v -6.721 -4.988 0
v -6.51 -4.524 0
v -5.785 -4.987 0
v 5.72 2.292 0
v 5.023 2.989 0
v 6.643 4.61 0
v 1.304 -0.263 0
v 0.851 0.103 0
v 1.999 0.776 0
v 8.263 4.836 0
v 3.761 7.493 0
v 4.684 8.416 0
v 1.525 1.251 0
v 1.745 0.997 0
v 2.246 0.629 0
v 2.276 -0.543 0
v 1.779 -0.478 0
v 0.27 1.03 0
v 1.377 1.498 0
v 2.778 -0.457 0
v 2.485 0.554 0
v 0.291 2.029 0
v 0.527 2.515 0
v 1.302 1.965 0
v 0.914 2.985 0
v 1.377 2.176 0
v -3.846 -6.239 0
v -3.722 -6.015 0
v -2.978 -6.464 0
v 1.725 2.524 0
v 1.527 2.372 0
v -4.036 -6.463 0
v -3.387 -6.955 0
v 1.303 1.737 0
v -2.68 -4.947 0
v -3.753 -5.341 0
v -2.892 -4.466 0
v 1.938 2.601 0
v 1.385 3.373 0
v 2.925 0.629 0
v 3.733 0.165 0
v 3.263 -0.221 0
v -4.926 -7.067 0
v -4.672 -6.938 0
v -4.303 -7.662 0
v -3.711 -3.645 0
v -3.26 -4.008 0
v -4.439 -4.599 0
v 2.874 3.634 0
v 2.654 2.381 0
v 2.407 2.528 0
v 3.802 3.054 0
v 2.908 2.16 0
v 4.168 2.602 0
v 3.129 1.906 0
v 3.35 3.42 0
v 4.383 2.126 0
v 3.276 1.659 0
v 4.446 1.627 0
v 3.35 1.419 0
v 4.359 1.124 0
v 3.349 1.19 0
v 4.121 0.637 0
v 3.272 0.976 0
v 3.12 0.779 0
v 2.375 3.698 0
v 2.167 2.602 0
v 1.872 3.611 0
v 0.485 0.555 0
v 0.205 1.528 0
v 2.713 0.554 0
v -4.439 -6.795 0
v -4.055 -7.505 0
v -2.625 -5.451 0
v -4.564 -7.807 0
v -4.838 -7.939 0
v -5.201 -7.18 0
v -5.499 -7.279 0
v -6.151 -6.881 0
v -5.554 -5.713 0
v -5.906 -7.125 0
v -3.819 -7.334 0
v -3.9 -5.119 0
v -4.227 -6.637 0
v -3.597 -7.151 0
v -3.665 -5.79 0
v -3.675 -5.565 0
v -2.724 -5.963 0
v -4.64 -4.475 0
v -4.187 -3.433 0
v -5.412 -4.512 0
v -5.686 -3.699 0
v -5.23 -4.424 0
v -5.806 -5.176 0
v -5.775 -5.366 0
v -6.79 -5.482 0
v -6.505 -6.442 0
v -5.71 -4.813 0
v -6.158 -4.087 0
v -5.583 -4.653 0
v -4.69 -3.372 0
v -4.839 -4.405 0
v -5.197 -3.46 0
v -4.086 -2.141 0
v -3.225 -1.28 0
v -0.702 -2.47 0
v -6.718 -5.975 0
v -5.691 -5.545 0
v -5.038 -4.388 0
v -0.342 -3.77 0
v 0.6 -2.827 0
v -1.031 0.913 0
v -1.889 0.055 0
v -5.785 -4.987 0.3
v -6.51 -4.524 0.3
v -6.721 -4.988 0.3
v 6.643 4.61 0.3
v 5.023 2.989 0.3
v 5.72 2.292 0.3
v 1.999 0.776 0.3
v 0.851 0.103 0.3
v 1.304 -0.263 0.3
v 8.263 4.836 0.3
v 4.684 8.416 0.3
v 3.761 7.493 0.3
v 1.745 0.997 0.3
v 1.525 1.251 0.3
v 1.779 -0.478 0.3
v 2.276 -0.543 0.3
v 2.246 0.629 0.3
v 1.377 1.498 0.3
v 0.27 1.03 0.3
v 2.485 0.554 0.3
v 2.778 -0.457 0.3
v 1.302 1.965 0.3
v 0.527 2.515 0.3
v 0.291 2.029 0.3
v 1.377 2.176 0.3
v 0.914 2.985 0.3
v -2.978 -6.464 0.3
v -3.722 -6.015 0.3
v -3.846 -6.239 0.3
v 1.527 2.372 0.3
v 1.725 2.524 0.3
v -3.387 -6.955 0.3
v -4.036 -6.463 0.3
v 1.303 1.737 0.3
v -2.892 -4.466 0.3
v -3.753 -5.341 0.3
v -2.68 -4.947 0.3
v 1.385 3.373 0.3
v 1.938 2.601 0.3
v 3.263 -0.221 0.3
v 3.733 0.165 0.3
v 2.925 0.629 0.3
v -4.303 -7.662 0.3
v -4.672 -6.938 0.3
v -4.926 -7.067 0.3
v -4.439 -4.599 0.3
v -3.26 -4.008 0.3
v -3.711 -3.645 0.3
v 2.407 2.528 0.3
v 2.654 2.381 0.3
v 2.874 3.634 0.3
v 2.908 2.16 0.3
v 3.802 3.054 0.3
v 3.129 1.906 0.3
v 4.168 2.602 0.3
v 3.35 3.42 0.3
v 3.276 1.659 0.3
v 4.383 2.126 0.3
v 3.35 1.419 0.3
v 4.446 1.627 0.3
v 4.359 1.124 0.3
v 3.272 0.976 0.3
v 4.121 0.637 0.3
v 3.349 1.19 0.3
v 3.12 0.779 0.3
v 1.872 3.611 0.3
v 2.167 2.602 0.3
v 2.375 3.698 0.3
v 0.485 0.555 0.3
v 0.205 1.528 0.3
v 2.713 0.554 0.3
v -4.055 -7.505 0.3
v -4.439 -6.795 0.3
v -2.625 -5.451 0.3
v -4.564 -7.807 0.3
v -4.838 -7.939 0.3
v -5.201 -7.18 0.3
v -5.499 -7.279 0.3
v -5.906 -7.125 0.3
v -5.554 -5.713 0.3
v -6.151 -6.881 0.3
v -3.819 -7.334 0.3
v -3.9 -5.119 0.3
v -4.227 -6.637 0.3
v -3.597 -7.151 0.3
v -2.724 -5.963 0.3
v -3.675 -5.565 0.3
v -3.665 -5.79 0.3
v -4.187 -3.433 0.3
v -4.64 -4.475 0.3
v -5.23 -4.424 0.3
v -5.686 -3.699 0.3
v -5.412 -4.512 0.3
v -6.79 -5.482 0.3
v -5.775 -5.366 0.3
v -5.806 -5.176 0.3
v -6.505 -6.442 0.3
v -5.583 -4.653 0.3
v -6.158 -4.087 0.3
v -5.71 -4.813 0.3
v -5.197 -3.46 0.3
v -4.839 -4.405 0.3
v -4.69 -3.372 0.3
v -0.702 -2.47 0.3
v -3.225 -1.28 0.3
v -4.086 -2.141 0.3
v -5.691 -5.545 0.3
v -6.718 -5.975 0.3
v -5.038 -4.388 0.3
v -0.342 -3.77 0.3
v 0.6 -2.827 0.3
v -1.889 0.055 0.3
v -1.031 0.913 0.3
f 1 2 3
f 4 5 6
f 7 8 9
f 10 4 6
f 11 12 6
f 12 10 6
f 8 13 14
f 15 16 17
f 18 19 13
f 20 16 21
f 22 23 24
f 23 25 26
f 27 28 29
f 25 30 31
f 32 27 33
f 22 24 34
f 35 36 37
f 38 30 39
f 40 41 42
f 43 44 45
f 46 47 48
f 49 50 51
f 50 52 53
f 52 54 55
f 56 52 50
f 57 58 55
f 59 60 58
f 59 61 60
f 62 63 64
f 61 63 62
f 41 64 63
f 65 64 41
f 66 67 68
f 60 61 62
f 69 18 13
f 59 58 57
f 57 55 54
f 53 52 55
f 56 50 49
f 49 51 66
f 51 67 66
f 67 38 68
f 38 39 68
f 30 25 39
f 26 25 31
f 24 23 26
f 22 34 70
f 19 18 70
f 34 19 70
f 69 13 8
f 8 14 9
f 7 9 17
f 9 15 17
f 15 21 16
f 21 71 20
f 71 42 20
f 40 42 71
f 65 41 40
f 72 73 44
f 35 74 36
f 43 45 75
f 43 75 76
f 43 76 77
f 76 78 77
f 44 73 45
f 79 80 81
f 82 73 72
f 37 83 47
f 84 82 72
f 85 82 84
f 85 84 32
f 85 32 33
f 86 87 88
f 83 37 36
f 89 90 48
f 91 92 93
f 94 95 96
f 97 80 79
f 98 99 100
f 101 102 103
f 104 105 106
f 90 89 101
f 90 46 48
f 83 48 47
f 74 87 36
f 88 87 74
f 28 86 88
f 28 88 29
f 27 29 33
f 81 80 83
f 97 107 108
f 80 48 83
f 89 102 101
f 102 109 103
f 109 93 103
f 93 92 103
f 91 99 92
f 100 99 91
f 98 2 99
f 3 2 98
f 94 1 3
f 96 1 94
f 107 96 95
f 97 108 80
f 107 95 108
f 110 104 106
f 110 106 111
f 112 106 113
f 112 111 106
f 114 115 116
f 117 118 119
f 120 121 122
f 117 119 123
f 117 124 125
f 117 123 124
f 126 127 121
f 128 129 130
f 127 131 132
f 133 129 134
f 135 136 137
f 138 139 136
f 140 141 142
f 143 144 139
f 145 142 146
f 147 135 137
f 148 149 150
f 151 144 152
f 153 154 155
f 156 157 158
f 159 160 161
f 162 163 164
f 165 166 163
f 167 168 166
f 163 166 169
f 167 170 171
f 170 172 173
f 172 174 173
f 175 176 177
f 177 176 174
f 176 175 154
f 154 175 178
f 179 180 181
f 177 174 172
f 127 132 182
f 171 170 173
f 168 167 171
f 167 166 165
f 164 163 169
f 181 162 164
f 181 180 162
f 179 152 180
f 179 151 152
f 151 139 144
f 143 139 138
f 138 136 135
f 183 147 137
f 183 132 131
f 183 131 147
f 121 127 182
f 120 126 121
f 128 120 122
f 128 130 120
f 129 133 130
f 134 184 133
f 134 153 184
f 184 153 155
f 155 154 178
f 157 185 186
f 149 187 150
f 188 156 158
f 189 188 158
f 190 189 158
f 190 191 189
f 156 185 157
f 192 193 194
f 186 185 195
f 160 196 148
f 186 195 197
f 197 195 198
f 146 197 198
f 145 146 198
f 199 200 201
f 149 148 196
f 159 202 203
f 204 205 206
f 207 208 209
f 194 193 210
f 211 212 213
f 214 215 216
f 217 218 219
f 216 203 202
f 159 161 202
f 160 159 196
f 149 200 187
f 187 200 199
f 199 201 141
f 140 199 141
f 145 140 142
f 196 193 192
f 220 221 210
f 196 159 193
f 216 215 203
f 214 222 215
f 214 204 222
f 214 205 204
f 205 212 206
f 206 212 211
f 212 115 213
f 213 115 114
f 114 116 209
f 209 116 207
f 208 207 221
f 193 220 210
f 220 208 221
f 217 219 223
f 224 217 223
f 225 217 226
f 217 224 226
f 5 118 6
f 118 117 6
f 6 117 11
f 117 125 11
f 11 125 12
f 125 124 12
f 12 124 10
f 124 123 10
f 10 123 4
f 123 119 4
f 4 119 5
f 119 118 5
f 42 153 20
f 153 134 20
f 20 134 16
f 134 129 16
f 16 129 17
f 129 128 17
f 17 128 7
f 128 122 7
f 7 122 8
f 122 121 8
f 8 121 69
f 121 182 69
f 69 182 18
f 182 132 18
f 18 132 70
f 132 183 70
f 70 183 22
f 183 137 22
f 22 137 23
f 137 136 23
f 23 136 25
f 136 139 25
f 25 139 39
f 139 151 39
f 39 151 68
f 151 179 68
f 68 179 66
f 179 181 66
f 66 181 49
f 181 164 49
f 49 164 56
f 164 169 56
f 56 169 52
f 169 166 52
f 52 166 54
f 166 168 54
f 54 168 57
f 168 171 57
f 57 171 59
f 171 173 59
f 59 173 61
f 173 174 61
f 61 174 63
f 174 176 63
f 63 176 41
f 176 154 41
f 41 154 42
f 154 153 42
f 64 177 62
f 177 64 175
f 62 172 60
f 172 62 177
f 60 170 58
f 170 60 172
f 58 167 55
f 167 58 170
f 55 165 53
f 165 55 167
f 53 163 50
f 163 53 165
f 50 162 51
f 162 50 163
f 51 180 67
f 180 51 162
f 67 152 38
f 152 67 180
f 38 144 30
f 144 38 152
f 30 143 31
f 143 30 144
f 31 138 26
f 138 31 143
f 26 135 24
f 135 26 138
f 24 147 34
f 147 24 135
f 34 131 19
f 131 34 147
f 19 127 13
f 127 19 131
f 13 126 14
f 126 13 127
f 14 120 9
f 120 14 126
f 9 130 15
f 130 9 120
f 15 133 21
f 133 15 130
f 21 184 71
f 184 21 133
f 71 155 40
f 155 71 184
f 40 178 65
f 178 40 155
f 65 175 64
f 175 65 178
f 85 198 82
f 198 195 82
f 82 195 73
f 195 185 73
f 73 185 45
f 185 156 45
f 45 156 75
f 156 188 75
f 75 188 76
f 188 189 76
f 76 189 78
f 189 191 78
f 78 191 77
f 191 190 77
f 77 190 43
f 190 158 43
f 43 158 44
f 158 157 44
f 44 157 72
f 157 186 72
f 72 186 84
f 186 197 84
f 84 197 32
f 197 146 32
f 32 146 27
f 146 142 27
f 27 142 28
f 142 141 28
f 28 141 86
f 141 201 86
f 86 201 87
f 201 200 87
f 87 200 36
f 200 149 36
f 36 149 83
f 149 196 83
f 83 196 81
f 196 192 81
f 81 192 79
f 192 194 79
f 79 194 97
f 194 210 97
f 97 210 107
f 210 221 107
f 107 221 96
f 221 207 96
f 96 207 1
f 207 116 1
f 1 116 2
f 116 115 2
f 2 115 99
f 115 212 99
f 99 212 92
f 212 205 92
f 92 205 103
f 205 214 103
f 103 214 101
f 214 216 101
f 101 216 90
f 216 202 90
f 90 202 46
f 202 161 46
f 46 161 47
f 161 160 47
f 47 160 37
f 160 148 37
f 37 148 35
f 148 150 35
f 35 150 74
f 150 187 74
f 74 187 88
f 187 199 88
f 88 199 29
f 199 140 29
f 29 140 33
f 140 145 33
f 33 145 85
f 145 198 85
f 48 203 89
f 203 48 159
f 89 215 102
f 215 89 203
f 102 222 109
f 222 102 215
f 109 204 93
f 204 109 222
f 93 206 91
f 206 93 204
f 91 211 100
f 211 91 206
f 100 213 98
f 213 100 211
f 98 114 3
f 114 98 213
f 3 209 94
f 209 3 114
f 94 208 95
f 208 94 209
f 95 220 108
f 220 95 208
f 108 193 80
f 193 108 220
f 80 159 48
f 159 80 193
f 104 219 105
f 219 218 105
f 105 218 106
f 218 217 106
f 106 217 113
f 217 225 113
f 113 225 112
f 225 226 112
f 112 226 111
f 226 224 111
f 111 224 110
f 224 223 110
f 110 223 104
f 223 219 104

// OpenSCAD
// Tests for layer switching

m=0.707;
base=4*0.3;
/*
intersection(){
difference(){
union(){
    // base
    color("green")
    translate([-10,-10,0])
    cube([20,20,base]);

    // pyramid
    translate([0,0,base])
    rotate([0,0,45])
    cylinder(15*m,20*m,0,$fn=4);
}

*/
union(){
    // Test text on the bottom side

    translate([0,0,0])
    rotate([0,0,45])
    mirror([1,0,0]) color("red") 
    linear_extrude(height=0.3){
        text("Love", font = "Open Sans:style=Bold", size=5,halign="center",valign="center",spacing=1.1);
    }

    }
/*
}

// Test for layer slicing
Zslice=0.3;
Nslice=20;
Z0=5*Zslice;
union(){
for(i=[0:Nslice]){
    translate([-10,-10,i*Zslice*2+Z0])
    cube([20,20,Zslice]);
    }
}

}

*/
